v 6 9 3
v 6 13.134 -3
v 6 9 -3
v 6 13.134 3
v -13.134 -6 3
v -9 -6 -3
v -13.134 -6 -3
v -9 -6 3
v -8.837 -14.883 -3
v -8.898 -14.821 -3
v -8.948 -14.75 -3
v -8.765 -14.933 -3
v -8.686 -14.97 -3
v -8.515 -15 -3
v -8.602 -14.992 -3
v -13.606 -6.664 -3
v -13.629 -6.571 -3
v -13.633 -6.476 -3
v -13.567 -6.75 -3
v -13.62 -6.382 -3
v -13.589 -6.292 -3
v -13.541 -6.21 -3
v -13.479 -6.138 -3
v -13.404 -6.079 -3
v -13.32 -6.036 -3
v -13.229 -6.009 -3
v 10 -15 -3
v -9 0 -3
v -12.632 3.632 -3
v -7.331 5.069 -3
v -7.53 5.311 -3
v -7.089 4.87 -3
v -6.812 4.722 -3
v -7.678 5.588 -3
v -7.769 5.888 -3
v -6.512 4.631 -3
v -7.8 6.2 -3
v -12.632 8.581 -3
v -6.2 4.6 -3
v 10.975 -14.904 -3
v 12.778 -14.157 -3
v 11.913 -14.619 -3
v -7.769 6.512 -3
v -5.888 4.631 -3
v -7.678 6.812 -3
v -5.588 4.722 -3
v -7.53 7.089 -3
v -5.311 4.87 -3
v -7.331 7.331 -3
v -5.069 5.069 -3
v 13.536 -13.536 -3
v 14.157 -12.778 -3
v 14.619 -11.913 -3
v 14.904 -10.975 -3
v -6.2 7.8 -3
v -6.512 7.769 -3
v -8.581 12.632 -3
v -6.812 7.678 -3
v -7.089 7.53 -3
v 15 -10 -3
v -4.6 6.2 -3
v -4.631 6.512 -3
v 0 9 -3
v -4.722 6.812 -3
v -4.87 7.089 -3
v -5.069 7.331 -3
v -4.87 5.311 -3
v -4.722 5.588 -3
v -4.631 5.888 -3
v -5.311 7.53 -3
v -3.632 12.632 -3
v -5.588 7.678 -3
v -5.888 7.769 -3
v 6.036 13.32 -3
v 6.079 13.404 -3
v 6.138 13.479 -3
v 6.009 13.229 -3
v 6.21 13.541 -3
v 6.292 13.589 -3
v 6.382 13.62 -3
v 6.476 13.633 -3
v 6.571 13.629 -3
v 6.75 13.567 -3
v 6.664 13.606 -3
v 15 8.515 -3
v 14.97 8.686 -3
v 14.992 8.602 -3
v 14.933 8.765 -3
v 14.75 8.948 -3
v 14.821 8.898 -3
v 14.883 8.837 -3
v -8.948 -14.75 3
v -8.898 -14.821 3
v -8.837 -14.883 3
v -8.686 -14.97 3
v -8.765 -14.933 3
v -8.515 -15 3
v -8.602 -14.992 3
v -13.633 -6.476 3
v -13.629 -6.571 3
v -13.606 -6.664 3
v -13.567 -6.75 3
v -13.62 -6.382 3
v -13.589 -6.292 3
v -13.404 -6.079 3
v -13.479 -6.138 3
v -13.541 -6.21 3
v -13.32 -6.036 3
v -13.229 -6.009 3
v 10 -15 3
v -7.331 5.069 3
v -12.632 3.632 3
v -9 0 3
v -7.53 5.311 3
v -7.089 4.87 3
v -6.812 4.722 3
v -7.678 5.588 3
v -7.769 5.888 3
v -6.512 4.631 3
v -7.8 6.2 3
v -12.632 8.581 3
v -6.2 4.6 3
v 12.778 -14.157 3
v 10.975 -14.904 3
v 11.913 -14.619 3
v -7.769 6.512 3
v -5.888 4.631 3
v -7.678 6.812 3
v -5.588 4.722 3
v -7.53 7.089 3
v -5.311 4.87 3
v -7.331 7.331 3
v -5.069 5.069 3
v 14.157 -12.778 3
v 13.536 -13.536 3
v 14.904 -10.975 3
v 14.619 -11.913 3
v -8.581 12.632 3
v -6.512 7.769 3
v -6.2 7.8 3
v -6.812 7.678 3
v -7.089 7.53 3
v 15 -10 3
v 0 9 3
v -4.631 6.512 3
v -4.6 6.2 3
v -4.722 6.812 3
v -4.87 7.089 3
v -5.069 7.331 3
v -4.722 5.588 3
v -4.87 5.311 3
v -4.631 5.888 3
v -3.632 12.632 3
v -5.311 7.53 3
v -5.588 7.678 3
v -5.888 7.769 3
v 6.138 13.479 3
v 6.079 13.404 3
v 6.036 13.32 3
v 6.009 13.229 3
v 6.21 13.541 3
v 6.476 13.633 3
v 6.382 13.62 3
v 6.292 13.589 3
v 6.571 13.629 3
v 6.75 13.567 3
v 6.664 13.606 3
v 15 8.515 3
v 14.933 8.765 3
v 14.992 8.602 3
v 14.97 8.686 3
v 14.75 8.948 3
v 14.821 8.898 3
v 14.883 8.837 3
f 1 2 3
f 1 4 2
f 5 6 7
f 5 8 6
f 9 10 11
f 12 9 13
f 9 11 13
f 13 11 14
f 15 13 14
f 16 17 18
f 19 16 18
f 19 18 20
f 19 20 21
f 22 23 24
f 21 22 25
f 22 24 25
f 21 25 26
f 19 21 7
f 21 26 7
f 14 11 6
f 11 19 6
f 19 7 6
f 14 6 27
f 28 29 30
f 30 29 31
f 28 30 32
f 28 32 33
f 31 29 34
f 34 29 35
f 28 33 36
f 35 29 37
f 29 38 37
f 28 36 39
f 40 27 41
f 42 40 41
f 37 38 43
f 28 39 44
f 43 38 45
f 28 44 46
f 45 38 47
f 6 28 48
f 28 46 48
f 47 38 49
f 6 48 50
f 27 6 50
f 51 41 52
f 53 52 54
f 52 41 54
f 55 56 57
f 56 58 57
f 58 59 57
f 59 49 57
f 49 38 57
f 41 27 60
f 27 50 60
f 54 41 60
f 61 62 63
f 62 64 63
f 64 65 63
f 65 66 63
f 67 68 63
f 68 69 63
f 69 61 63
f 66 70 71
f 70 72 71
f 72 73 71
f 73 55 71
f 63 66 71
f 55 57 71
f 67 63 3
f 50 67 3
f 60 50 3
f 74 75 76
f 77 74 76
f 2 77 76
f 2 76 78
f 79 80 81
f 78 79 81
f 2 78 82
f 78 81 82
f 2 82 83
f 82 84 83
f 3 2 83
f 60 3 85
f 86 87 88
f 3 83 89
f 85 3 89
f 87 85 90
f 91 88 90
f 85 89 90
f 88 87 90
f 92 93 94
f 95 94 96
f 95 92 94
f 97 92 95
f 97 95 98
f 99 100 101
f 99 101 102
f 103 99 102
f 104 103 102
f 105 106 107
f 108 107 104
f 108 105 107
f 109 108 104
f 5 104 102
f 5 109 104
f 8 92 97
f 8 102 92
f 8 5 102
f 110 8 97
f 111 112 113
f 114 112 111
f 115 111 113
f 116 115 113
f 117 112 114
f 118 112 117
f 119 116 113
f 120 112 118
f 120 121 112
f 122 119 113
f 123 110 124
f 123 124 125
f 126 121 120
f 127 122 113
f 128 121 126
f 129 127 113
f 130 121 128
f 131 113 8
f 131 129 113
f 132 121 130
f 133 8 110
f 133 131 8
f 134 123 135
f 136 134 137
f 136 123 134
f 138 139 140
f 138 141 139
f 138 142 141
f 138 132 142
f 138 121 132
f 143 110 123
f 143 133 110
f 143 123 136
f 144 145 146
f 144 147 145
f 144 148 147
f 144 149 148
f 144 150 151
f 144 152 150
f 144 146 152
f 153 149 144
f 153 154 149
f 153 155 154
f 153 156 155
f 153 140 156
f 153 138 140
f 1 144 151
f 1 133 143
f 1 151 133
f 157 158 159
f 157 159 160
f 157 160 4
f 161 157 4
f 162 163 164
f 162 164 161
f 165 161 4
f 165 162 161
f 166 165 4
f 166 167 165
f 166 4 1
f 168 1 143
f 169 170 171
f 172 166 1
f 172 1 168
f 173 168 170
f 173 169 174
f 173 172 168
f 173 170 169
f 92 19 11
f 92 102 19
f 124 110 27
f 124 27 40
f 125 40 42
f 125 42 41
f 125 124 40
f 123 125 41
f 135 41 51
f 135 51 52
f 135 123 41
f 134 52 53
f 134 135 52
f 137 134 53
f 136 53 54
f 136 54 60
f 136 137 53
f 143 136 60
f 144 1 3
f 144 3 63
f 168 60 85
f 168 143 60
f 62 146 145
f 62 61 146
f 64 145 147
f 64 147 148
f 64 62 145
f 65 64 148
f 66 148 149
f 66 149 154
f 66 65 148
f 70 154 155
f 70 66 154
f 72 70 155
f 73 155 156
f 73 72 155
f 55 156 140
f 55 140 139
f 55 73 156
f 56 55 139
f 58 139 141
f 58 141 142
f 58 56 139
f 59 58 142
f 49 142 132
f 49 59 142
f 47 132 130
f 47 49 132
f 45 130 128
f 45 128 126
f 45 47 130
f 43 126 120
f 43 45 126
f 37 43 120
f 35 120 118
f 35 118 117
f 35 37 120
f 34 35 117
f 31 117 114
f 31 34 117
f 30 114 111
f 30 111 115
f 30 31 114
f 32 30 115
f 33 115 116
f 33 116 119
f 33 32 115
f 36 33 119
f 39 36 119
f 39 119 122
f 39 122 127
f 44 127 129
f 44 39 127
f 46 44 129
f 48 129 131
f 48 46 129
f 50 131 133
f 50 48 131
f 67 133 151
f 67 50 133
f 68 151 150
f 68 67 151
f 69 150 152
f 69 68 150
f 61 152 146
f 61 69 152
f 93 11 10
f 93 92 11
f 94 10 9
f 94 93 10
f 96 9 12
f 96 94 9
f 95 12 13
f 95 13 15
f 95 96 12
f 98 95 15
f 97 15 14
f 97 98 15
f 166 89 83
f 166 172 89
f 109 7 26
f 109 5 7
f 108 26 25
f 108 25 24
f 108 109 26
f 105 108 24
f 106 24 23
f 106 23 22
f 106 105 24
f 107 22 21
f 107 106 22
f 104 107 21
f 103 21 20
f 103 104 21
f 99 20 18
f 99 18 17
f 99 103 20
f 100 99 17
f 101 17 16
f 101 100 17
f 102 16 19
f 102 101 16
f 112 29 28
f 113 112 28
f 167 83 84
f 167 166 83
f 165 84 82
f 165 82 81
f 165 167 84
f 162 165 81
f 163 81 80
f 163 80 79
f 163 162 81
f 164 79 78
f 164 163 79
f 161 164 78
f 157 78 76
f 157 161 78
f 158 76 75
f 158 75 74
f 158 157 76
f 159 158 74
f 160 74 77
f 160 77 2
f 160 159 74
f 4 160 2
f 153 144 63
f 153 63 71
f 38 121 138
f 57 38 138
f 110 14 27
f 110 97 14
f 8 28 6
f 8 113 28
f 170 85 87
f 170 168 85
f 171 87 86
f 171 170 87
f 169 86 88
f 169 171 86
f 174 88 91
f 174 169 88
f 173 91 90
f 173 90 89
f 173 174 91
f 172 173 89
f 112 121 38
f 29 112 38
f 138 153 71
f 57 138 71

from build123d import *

# Parameters (mm, degrees)
SKETCH1_R           = 1.6
BOSS_EXTRUDE1_DEPTH = 3
BOSS_EXTRUDE2_DEPTH = 3
FILLET1_R           = 0.5
CUT_EXTRUDE1_REACH  = 8
CHAMFER1_SIZE       = 3.5


with BuildPart() as part:
    # Sketch1 → Boss-Extrude1 (new body, symmetric)
    with BuildSketch(Plane.XY):
        Polygon((0, 0), (-21.213203436, 0), (0, 21.213203436), align=None)
        with Locations((-6.2, 6.2)):
            Circle(SKETCH1_R, mode=Mode.SUBTRACT)
    extrude(amount=BOSS_EXTRUDE1_DEPTH, both=True)

    # Sketch2 → Boss-Extrude2 (add, symmetric)
    with BuildSketch(Plane.XY):
        with BuildLine():
            Line((-9, 0), (-9, -6))
            Line((-9, -6), (-14, -6))
            Line((-14, -6), (-8.803847577, -15))
            Line((-8.803847577, -15), (10, -15))
            ThreePointArc((10, -15), (13.535533906, -13.535533906), (15, -10))
            Line((15, -10), (15, 8.803847577))
            Line((15, 8.803847577), (6, 14))
            Line((6, 14), (6, 9))
            Line((6, 9), (0, 9))
            Line((0, 9), (0, 0))
            Line((0, 0), (-9, 0))
        make_face()
    extrude(amount=BOSS_EXTRUDE2_DEPTH, both=True)

    # Fillet1
    fillet1_edges = [part.edges().sort_by_distance(p)[0] for p in [
        (-14, -6, 0),
        (-8.803847577, -15, 0),
        (15, 8.803847577, 0),
        (6, 14, 0),
    ]]
    fillet(fillet1_edges, radius=FILLET1_R)

    # Sketch4 → Cut-Extrude1 (cut, up to next)
    with BuildSketch(Plane.XY.offset(3), mode=Mode.PRIVATE) as cut_extrude1_sk1:
        Polygon((0, 9), (-6.106601718, 15.106601718), (0, 21.213203436), align=None)
    cut_extrude1_tool1 = extrude(cut_extrude1_sk1.sketch, amount=-CUT_EXTRUDE1_REACH, mode=Mode.PRIVATE) & part.part
    add(cut_extrude1_tool1.solids().sort_by_distance((-2.035534, 15.106602, 3))[0], mode=Mode.SUBTRACT)
    # Sketch4 → Cut-Extrude1 (cut, up to next)
    with BuildSketch(Plane.XY.offset(3), mode=Mode.PRIVATE) as cut_extrude1_sk2:
        Polygon((-21.213203436, 0), (-15.106601718, 6.106601718), (-9, 0), align=None)
    cut_extrude1_tool2 = extrude(cut_extrude1_sk2.sketch, amount=-CUT_EXTRUDE1_REACH, mode=Mode.PRIVATE) & part.part
    add(cut_extrude1_tool2.solids().sort_by_distance((-15.106602, 2.035534, 3))[0], mode=Mode.SUBTRACT)

    # Chamfer1
    chamfer1_edges = [part.edges().sort_by_distance(p)[0] for p in [
        (-6.106601718, 15.106601718, 0),
        (-15.106601718, 6.106601718, 0),
    ]]
    chamfer(chamfer1_edges, length=CHAMFER1_SIZE)


solid = part.part
